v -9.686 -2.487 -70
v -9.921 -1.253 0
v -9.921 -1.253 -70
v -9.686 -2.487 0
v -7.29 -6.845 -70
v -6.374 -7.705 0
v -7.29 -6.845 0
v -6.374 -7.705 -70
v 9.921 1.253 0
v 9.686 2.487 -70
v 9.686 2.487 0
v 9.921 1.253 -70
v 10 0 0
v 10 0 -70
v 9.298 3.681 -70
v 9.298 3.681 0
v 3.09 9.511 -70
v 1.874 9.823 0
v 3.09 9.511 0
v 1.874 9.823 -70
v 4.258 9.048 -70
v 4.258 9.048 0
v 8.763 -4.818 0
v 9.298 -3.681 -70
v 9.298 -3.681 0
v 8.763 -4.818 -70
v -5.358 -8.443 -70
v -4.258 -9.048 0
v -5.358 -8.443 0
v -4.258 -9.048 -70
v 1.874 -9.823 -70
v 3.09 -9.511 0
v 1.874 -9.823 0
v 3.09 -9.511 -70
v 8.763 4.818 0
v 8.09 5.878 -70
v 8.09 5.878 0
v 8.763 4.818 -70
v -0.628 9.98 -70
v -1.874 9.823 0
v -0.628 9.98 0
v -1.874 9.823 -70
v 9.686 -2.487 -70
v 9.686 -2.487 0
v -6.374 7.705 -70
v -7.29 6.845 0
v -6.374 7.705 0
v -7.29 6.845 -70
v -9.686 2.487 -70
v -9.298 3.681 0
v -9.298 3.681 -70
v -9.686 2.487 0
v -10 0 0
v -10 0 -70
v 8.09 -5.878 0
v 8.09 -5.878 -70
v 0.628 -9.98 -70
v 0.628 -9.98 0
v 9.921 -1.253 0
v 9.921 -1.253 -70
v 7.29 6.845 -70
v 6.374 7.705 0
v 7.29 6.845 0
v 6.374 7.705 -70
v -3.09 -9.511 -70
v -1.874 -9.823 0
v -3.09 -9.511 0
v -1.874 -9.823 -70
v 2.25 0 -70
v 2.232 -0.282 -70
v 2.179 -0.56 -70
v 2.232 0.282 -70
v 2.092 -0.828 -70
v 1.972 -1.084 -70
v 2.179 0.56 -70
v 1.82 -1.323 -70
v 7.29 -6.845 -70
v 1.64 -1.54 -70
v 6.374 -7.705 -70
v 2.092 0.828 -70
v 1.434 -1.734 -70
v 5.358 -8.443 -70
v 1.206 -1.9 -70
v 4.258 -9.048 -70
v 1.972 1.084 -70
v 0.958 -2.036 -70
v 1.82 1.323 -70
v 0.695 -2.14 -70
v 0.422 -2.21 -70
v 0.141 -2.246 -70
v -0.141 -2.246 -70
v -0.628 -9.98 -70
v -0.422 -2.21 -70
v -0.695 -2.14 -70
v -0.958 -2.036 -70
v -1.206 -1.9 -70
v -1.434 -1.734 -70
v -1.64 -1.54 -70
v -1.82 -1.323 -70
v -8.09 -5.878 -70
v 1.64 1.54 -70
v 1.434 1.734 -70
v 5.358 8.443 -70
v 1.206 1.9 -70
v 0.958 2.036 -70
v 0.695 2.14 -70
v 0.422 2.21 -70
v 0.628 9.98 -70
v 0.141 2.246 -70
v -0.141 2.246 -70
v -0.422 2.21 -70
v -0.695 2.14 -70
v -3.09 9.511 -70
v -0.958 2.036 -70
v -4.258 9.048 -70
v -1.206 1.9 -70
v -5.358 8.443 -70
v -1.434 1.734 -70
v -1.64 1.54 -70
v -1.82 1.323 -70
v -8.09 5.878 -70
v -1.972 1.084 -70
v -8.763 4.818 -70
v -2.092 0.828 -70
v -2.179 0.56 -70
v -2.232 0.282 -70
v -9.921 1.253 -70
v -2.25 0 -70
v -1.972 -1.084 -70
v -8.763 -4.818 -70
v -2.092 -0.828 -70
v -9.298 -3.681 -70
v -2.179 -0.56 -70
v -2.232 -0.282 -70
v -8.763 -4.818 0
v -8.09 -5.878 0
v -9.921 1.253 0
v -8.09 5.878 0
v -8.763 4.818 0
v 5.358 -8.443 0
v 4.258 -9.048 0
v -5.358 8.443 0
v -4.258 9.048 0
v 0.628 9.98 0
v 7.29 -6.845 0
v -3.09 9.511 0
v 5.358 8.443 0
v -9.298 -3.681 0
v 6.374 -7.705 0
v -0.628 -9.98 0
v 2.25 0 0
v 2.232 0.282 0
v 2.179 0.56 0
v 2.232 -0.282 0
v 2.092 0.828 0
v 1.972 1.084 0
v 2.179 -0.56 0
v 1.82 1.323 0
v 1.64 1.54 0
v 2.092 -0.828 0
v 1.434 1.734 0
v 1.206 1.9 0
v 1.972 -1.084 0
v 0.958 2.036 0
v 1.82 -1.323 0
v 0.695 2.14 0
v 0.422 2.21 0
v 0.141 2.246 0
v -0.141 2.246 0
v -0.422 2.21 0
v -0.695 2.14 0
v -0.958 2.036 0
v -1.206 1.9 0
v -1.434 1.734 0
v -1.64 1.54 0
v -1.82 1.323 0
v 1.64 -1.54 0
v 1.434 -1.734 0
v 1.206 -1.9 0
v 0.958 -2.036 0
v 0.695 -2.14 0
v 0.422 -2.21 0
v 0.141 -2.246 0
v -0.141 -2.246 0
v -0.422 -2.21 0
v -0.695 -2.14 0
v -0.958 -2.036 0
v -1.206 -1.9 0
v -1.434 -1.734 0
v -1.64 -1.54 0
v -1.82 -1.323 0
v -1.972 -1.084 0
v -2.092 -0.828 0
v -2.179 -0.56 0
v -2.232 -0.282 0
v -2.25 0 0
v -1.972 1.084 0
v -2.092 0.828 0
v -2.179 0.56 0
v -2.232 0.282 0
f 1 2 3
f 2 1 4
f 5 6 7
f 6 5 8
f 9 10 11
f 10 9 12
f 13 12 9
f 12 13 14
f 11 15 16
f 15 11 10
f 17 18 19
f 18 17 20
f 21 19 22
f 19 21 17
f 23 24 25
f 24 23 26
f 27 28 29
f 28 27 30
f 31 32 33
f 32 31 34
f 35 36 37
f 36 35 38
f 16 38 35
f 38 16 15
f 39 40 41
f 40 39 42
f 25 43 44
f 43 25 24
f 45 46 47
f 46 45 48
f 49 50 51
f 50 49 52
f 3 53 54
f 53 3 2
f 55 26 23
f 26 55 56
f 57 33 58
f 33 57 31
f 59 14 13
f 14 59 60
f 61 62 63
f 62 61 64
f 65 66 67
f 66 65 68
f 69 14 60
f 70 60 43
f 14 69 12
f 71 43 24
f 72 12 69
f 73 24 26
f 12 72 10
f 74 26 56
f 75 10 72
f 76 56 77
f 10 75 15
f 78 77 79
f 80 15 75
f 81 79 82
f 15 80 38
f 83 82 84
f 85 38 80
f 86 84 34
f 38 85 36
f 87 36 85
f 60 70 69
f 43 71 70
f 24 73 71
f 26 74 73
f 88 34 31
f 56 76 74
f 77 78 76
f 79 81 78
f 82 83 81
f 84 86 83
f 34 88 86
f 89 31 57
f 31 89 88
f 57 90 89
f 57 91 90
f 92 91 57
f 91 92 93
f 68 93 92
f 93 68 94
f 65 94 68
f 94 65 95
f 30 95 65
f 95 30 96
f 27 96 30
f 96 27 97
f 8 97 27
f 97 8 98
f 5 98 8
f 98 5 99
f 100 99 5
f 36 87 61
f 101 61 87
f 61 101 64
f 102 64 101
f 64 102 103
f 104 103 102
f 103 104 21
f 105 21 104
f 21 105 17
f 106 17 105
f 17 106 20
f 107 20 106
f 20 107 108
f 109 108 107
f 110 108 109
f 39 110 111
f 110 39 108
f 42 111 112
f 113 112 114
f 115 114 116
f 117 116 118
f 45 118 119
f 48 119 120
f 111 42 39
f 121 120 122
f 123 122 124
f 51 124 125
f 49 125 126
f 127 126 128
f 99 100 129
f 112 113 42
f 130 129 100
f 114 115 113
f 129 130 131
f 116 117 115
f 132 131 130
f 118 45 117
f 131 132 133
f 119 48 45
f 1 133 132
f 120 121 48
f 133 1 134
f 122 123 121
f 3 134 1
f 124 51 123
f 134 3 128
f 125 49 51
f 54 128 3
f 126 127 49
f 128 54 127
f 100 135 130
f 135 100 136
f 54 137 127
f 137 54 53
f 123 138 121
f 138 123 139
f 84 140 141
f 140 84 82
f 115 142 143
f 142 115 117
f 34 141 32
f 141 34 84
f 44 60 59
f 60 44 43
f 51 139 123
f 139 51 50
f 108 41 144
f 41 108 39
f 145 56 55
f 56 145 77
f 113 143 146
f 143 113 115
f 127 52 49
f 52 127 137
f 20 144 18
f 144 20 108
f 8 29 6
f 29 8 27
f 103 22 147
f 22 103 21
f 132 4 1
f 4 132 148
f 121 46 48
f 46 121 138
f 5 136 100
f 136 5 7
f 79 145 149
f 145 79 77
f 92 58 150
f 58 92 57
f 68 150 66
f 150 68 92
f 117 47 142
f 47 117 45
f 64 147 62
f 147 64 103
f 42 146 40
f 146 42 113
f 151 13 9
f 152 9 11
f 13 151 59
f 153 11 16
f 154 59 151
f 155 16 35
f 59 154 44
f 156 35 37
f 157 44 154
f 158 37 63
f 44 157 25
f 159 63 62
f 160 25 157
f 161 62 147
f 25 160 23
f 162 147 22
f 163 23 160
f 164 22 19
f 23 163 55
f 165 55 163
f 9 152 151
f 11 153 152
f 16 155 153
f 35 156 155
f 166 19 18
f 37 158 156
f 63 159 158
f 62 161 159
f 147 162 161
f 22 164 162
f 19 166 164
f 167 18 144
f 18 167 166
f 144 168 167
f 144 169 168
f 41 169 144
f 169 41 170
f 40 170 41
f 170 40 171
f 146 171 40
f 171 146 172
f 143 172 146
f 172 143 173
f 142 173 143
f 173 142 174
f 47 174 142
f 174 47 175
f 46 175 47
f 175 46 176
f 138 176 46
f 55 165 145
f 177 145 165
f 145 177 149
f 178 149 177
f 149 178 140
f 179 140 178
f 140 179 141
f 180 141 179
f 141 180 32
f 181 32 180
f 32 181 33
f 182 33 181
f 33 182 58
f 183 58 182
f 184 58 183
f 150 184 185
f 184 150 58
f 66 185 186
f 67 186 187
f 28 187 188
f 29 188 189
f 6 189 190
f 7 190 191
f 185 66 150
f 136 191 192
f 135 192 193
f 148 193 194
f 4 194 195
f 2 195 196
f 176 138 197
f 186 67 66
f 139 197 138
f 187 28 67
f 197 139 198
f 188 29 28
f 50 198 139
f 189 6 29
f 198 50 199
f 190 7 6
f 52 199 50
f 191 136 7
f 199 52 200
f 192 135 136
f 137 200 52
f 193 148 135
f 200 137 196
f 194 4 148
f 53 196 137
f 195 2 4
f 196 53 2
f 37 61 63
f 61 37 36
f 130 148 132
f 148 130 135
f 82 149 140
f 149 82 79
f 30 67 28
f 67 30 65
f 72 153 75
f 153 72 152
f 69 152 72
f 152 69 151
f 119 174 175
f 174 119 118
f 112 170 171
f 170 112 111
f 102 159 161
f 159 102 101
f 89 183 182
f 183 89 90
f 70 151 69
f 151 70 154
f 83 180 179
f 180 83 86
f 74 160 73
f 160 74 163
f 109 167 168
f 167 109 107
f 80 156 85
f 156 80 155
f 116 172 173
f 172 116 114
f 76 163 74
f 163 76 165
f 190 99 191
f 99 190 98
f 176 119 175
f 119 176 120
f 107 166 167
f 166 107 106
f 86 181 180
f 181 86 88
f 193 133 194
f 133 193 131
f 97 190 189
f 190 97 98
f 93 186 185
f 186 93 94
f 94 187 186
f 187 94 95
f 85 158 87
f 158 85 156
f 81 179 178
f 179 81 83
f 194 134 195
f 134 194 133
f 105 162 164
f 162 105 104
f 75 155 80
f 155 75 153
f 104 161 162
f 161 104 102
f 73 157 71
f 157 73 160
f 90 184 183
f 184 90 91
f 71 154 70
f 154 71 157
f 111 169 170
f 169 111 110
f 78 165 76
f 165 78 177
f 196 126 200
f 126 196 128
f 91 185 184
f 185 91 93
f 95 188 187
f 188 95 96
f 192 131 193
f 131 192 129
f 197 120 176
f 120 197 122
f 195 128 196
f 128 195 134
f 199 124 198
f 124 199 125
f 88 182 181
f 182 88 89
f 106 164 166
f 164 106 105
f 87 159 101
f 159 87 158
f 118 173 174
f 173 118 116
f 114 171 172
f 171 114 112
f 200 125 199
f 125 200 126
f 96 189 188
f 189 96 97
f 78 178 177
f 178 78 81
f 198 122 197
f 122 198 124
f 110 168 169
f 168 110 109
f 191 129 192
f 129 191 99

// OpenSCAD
$fn = 50;


difference() {
	union() {
		translate(v = [0, 0, -70.0000000000]) {
			cylinder(h = 70, r = 10.0000000000);
		}
		cylinder(h = 0, r = 19.0000000000);
	}
	union() {
		#translate(v = [0, 0, -70]) {
			cylinder(h = 70, r = 2.2500000000);
		}
	}
}
